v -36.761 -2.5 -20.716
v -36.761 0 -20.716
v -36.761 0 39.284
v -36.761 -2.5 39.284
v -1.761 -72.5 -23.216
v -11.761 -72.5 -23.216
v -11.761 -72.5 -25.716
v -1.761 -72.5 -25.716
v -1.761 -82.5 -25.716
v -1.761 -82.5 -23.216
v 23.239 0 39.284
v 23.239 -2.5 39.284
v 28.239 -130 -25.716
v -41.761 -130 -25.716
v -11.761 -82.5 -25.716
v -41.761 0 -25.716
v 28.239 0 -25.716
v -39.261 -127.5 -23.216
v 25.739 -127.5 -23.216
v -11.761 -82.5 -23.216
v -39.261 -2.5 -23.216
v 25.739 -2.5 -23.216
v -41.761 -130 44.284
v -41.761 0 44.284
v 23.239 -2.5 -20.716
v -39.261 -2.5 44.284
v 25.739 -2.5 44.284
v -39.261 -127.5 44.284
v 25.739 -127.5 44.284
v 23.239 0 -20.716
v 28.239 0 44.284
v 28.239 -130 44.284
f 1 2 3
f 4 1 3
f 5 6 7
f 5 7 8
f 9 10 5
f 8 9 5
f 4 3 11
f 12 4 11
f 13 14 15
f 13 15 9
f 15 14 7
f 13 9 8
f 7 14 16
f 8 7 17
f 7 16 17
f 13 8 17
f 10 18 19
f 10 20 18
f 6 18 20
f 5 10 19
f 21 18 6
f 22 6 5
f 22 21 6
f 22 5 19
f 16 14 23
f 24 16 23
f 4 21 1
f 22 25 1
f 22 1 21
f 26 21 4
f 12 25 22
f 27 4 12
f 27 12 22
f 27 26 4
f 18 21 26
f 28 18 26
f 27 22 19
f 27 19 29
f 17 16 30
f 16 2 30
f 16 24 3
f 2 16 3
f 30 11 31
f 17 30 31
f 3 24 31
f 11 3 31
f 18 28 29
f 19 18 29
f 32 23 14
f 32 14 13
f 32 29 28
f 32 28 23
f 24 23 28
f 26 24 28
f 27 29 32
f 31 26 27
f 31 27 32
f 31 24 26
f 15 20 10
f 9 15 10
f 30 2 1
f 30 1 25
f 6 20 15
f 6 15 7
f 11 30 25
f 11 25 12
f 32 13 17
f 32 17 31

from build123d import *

# Parameters (mm, degrees)
F0_W     = 70
F0_H     = 70
F1_DEPTH = 130
F2_T     = -2.5
F3_W     = 60
F3_H     = 60
F4_DEPTH = 25
F5_W     = 10
F5_H     = 10
F6_DEPTH = 25


with BuildPart() as f1:
    # F0 (on Front) → F1 (new body)
    with BuildSketch(Plane.XZ):
        with Locations((-6.760671, 9.284316)):
            Rectangle(F0_W, F0_H)
    extrude(amount=F1_DEPTH)

    # F2
    f2_openings = [f1.faces().sort_by_distance(p)[0] for p in [
        (-6.760671, -65, 44.284316),
    ]]
    offset(amount=F2_T, openings=f2_openings)

    # F3 (on Front) → F4 (cut)
    with BuildSketch(Plane.XZ):
        with Locations((-6.760671, 9.284316)):
            Rectangle(F3_W, F3_H)
    extrude(amount=F4_DEPTH, mode=Mode.SUBTRACT)

    # F5 (on face) → F6 (cut)
    with BuildSketch(Plane.XY.offset(-23.215684)):
        with Locations((-6.760671, -77.5)):
            Rectangle(F5_W, F5_H)
    extrude(amount=-F6_DEPTH, mode=Mode.SUBTRACT)


solid = f1.part
